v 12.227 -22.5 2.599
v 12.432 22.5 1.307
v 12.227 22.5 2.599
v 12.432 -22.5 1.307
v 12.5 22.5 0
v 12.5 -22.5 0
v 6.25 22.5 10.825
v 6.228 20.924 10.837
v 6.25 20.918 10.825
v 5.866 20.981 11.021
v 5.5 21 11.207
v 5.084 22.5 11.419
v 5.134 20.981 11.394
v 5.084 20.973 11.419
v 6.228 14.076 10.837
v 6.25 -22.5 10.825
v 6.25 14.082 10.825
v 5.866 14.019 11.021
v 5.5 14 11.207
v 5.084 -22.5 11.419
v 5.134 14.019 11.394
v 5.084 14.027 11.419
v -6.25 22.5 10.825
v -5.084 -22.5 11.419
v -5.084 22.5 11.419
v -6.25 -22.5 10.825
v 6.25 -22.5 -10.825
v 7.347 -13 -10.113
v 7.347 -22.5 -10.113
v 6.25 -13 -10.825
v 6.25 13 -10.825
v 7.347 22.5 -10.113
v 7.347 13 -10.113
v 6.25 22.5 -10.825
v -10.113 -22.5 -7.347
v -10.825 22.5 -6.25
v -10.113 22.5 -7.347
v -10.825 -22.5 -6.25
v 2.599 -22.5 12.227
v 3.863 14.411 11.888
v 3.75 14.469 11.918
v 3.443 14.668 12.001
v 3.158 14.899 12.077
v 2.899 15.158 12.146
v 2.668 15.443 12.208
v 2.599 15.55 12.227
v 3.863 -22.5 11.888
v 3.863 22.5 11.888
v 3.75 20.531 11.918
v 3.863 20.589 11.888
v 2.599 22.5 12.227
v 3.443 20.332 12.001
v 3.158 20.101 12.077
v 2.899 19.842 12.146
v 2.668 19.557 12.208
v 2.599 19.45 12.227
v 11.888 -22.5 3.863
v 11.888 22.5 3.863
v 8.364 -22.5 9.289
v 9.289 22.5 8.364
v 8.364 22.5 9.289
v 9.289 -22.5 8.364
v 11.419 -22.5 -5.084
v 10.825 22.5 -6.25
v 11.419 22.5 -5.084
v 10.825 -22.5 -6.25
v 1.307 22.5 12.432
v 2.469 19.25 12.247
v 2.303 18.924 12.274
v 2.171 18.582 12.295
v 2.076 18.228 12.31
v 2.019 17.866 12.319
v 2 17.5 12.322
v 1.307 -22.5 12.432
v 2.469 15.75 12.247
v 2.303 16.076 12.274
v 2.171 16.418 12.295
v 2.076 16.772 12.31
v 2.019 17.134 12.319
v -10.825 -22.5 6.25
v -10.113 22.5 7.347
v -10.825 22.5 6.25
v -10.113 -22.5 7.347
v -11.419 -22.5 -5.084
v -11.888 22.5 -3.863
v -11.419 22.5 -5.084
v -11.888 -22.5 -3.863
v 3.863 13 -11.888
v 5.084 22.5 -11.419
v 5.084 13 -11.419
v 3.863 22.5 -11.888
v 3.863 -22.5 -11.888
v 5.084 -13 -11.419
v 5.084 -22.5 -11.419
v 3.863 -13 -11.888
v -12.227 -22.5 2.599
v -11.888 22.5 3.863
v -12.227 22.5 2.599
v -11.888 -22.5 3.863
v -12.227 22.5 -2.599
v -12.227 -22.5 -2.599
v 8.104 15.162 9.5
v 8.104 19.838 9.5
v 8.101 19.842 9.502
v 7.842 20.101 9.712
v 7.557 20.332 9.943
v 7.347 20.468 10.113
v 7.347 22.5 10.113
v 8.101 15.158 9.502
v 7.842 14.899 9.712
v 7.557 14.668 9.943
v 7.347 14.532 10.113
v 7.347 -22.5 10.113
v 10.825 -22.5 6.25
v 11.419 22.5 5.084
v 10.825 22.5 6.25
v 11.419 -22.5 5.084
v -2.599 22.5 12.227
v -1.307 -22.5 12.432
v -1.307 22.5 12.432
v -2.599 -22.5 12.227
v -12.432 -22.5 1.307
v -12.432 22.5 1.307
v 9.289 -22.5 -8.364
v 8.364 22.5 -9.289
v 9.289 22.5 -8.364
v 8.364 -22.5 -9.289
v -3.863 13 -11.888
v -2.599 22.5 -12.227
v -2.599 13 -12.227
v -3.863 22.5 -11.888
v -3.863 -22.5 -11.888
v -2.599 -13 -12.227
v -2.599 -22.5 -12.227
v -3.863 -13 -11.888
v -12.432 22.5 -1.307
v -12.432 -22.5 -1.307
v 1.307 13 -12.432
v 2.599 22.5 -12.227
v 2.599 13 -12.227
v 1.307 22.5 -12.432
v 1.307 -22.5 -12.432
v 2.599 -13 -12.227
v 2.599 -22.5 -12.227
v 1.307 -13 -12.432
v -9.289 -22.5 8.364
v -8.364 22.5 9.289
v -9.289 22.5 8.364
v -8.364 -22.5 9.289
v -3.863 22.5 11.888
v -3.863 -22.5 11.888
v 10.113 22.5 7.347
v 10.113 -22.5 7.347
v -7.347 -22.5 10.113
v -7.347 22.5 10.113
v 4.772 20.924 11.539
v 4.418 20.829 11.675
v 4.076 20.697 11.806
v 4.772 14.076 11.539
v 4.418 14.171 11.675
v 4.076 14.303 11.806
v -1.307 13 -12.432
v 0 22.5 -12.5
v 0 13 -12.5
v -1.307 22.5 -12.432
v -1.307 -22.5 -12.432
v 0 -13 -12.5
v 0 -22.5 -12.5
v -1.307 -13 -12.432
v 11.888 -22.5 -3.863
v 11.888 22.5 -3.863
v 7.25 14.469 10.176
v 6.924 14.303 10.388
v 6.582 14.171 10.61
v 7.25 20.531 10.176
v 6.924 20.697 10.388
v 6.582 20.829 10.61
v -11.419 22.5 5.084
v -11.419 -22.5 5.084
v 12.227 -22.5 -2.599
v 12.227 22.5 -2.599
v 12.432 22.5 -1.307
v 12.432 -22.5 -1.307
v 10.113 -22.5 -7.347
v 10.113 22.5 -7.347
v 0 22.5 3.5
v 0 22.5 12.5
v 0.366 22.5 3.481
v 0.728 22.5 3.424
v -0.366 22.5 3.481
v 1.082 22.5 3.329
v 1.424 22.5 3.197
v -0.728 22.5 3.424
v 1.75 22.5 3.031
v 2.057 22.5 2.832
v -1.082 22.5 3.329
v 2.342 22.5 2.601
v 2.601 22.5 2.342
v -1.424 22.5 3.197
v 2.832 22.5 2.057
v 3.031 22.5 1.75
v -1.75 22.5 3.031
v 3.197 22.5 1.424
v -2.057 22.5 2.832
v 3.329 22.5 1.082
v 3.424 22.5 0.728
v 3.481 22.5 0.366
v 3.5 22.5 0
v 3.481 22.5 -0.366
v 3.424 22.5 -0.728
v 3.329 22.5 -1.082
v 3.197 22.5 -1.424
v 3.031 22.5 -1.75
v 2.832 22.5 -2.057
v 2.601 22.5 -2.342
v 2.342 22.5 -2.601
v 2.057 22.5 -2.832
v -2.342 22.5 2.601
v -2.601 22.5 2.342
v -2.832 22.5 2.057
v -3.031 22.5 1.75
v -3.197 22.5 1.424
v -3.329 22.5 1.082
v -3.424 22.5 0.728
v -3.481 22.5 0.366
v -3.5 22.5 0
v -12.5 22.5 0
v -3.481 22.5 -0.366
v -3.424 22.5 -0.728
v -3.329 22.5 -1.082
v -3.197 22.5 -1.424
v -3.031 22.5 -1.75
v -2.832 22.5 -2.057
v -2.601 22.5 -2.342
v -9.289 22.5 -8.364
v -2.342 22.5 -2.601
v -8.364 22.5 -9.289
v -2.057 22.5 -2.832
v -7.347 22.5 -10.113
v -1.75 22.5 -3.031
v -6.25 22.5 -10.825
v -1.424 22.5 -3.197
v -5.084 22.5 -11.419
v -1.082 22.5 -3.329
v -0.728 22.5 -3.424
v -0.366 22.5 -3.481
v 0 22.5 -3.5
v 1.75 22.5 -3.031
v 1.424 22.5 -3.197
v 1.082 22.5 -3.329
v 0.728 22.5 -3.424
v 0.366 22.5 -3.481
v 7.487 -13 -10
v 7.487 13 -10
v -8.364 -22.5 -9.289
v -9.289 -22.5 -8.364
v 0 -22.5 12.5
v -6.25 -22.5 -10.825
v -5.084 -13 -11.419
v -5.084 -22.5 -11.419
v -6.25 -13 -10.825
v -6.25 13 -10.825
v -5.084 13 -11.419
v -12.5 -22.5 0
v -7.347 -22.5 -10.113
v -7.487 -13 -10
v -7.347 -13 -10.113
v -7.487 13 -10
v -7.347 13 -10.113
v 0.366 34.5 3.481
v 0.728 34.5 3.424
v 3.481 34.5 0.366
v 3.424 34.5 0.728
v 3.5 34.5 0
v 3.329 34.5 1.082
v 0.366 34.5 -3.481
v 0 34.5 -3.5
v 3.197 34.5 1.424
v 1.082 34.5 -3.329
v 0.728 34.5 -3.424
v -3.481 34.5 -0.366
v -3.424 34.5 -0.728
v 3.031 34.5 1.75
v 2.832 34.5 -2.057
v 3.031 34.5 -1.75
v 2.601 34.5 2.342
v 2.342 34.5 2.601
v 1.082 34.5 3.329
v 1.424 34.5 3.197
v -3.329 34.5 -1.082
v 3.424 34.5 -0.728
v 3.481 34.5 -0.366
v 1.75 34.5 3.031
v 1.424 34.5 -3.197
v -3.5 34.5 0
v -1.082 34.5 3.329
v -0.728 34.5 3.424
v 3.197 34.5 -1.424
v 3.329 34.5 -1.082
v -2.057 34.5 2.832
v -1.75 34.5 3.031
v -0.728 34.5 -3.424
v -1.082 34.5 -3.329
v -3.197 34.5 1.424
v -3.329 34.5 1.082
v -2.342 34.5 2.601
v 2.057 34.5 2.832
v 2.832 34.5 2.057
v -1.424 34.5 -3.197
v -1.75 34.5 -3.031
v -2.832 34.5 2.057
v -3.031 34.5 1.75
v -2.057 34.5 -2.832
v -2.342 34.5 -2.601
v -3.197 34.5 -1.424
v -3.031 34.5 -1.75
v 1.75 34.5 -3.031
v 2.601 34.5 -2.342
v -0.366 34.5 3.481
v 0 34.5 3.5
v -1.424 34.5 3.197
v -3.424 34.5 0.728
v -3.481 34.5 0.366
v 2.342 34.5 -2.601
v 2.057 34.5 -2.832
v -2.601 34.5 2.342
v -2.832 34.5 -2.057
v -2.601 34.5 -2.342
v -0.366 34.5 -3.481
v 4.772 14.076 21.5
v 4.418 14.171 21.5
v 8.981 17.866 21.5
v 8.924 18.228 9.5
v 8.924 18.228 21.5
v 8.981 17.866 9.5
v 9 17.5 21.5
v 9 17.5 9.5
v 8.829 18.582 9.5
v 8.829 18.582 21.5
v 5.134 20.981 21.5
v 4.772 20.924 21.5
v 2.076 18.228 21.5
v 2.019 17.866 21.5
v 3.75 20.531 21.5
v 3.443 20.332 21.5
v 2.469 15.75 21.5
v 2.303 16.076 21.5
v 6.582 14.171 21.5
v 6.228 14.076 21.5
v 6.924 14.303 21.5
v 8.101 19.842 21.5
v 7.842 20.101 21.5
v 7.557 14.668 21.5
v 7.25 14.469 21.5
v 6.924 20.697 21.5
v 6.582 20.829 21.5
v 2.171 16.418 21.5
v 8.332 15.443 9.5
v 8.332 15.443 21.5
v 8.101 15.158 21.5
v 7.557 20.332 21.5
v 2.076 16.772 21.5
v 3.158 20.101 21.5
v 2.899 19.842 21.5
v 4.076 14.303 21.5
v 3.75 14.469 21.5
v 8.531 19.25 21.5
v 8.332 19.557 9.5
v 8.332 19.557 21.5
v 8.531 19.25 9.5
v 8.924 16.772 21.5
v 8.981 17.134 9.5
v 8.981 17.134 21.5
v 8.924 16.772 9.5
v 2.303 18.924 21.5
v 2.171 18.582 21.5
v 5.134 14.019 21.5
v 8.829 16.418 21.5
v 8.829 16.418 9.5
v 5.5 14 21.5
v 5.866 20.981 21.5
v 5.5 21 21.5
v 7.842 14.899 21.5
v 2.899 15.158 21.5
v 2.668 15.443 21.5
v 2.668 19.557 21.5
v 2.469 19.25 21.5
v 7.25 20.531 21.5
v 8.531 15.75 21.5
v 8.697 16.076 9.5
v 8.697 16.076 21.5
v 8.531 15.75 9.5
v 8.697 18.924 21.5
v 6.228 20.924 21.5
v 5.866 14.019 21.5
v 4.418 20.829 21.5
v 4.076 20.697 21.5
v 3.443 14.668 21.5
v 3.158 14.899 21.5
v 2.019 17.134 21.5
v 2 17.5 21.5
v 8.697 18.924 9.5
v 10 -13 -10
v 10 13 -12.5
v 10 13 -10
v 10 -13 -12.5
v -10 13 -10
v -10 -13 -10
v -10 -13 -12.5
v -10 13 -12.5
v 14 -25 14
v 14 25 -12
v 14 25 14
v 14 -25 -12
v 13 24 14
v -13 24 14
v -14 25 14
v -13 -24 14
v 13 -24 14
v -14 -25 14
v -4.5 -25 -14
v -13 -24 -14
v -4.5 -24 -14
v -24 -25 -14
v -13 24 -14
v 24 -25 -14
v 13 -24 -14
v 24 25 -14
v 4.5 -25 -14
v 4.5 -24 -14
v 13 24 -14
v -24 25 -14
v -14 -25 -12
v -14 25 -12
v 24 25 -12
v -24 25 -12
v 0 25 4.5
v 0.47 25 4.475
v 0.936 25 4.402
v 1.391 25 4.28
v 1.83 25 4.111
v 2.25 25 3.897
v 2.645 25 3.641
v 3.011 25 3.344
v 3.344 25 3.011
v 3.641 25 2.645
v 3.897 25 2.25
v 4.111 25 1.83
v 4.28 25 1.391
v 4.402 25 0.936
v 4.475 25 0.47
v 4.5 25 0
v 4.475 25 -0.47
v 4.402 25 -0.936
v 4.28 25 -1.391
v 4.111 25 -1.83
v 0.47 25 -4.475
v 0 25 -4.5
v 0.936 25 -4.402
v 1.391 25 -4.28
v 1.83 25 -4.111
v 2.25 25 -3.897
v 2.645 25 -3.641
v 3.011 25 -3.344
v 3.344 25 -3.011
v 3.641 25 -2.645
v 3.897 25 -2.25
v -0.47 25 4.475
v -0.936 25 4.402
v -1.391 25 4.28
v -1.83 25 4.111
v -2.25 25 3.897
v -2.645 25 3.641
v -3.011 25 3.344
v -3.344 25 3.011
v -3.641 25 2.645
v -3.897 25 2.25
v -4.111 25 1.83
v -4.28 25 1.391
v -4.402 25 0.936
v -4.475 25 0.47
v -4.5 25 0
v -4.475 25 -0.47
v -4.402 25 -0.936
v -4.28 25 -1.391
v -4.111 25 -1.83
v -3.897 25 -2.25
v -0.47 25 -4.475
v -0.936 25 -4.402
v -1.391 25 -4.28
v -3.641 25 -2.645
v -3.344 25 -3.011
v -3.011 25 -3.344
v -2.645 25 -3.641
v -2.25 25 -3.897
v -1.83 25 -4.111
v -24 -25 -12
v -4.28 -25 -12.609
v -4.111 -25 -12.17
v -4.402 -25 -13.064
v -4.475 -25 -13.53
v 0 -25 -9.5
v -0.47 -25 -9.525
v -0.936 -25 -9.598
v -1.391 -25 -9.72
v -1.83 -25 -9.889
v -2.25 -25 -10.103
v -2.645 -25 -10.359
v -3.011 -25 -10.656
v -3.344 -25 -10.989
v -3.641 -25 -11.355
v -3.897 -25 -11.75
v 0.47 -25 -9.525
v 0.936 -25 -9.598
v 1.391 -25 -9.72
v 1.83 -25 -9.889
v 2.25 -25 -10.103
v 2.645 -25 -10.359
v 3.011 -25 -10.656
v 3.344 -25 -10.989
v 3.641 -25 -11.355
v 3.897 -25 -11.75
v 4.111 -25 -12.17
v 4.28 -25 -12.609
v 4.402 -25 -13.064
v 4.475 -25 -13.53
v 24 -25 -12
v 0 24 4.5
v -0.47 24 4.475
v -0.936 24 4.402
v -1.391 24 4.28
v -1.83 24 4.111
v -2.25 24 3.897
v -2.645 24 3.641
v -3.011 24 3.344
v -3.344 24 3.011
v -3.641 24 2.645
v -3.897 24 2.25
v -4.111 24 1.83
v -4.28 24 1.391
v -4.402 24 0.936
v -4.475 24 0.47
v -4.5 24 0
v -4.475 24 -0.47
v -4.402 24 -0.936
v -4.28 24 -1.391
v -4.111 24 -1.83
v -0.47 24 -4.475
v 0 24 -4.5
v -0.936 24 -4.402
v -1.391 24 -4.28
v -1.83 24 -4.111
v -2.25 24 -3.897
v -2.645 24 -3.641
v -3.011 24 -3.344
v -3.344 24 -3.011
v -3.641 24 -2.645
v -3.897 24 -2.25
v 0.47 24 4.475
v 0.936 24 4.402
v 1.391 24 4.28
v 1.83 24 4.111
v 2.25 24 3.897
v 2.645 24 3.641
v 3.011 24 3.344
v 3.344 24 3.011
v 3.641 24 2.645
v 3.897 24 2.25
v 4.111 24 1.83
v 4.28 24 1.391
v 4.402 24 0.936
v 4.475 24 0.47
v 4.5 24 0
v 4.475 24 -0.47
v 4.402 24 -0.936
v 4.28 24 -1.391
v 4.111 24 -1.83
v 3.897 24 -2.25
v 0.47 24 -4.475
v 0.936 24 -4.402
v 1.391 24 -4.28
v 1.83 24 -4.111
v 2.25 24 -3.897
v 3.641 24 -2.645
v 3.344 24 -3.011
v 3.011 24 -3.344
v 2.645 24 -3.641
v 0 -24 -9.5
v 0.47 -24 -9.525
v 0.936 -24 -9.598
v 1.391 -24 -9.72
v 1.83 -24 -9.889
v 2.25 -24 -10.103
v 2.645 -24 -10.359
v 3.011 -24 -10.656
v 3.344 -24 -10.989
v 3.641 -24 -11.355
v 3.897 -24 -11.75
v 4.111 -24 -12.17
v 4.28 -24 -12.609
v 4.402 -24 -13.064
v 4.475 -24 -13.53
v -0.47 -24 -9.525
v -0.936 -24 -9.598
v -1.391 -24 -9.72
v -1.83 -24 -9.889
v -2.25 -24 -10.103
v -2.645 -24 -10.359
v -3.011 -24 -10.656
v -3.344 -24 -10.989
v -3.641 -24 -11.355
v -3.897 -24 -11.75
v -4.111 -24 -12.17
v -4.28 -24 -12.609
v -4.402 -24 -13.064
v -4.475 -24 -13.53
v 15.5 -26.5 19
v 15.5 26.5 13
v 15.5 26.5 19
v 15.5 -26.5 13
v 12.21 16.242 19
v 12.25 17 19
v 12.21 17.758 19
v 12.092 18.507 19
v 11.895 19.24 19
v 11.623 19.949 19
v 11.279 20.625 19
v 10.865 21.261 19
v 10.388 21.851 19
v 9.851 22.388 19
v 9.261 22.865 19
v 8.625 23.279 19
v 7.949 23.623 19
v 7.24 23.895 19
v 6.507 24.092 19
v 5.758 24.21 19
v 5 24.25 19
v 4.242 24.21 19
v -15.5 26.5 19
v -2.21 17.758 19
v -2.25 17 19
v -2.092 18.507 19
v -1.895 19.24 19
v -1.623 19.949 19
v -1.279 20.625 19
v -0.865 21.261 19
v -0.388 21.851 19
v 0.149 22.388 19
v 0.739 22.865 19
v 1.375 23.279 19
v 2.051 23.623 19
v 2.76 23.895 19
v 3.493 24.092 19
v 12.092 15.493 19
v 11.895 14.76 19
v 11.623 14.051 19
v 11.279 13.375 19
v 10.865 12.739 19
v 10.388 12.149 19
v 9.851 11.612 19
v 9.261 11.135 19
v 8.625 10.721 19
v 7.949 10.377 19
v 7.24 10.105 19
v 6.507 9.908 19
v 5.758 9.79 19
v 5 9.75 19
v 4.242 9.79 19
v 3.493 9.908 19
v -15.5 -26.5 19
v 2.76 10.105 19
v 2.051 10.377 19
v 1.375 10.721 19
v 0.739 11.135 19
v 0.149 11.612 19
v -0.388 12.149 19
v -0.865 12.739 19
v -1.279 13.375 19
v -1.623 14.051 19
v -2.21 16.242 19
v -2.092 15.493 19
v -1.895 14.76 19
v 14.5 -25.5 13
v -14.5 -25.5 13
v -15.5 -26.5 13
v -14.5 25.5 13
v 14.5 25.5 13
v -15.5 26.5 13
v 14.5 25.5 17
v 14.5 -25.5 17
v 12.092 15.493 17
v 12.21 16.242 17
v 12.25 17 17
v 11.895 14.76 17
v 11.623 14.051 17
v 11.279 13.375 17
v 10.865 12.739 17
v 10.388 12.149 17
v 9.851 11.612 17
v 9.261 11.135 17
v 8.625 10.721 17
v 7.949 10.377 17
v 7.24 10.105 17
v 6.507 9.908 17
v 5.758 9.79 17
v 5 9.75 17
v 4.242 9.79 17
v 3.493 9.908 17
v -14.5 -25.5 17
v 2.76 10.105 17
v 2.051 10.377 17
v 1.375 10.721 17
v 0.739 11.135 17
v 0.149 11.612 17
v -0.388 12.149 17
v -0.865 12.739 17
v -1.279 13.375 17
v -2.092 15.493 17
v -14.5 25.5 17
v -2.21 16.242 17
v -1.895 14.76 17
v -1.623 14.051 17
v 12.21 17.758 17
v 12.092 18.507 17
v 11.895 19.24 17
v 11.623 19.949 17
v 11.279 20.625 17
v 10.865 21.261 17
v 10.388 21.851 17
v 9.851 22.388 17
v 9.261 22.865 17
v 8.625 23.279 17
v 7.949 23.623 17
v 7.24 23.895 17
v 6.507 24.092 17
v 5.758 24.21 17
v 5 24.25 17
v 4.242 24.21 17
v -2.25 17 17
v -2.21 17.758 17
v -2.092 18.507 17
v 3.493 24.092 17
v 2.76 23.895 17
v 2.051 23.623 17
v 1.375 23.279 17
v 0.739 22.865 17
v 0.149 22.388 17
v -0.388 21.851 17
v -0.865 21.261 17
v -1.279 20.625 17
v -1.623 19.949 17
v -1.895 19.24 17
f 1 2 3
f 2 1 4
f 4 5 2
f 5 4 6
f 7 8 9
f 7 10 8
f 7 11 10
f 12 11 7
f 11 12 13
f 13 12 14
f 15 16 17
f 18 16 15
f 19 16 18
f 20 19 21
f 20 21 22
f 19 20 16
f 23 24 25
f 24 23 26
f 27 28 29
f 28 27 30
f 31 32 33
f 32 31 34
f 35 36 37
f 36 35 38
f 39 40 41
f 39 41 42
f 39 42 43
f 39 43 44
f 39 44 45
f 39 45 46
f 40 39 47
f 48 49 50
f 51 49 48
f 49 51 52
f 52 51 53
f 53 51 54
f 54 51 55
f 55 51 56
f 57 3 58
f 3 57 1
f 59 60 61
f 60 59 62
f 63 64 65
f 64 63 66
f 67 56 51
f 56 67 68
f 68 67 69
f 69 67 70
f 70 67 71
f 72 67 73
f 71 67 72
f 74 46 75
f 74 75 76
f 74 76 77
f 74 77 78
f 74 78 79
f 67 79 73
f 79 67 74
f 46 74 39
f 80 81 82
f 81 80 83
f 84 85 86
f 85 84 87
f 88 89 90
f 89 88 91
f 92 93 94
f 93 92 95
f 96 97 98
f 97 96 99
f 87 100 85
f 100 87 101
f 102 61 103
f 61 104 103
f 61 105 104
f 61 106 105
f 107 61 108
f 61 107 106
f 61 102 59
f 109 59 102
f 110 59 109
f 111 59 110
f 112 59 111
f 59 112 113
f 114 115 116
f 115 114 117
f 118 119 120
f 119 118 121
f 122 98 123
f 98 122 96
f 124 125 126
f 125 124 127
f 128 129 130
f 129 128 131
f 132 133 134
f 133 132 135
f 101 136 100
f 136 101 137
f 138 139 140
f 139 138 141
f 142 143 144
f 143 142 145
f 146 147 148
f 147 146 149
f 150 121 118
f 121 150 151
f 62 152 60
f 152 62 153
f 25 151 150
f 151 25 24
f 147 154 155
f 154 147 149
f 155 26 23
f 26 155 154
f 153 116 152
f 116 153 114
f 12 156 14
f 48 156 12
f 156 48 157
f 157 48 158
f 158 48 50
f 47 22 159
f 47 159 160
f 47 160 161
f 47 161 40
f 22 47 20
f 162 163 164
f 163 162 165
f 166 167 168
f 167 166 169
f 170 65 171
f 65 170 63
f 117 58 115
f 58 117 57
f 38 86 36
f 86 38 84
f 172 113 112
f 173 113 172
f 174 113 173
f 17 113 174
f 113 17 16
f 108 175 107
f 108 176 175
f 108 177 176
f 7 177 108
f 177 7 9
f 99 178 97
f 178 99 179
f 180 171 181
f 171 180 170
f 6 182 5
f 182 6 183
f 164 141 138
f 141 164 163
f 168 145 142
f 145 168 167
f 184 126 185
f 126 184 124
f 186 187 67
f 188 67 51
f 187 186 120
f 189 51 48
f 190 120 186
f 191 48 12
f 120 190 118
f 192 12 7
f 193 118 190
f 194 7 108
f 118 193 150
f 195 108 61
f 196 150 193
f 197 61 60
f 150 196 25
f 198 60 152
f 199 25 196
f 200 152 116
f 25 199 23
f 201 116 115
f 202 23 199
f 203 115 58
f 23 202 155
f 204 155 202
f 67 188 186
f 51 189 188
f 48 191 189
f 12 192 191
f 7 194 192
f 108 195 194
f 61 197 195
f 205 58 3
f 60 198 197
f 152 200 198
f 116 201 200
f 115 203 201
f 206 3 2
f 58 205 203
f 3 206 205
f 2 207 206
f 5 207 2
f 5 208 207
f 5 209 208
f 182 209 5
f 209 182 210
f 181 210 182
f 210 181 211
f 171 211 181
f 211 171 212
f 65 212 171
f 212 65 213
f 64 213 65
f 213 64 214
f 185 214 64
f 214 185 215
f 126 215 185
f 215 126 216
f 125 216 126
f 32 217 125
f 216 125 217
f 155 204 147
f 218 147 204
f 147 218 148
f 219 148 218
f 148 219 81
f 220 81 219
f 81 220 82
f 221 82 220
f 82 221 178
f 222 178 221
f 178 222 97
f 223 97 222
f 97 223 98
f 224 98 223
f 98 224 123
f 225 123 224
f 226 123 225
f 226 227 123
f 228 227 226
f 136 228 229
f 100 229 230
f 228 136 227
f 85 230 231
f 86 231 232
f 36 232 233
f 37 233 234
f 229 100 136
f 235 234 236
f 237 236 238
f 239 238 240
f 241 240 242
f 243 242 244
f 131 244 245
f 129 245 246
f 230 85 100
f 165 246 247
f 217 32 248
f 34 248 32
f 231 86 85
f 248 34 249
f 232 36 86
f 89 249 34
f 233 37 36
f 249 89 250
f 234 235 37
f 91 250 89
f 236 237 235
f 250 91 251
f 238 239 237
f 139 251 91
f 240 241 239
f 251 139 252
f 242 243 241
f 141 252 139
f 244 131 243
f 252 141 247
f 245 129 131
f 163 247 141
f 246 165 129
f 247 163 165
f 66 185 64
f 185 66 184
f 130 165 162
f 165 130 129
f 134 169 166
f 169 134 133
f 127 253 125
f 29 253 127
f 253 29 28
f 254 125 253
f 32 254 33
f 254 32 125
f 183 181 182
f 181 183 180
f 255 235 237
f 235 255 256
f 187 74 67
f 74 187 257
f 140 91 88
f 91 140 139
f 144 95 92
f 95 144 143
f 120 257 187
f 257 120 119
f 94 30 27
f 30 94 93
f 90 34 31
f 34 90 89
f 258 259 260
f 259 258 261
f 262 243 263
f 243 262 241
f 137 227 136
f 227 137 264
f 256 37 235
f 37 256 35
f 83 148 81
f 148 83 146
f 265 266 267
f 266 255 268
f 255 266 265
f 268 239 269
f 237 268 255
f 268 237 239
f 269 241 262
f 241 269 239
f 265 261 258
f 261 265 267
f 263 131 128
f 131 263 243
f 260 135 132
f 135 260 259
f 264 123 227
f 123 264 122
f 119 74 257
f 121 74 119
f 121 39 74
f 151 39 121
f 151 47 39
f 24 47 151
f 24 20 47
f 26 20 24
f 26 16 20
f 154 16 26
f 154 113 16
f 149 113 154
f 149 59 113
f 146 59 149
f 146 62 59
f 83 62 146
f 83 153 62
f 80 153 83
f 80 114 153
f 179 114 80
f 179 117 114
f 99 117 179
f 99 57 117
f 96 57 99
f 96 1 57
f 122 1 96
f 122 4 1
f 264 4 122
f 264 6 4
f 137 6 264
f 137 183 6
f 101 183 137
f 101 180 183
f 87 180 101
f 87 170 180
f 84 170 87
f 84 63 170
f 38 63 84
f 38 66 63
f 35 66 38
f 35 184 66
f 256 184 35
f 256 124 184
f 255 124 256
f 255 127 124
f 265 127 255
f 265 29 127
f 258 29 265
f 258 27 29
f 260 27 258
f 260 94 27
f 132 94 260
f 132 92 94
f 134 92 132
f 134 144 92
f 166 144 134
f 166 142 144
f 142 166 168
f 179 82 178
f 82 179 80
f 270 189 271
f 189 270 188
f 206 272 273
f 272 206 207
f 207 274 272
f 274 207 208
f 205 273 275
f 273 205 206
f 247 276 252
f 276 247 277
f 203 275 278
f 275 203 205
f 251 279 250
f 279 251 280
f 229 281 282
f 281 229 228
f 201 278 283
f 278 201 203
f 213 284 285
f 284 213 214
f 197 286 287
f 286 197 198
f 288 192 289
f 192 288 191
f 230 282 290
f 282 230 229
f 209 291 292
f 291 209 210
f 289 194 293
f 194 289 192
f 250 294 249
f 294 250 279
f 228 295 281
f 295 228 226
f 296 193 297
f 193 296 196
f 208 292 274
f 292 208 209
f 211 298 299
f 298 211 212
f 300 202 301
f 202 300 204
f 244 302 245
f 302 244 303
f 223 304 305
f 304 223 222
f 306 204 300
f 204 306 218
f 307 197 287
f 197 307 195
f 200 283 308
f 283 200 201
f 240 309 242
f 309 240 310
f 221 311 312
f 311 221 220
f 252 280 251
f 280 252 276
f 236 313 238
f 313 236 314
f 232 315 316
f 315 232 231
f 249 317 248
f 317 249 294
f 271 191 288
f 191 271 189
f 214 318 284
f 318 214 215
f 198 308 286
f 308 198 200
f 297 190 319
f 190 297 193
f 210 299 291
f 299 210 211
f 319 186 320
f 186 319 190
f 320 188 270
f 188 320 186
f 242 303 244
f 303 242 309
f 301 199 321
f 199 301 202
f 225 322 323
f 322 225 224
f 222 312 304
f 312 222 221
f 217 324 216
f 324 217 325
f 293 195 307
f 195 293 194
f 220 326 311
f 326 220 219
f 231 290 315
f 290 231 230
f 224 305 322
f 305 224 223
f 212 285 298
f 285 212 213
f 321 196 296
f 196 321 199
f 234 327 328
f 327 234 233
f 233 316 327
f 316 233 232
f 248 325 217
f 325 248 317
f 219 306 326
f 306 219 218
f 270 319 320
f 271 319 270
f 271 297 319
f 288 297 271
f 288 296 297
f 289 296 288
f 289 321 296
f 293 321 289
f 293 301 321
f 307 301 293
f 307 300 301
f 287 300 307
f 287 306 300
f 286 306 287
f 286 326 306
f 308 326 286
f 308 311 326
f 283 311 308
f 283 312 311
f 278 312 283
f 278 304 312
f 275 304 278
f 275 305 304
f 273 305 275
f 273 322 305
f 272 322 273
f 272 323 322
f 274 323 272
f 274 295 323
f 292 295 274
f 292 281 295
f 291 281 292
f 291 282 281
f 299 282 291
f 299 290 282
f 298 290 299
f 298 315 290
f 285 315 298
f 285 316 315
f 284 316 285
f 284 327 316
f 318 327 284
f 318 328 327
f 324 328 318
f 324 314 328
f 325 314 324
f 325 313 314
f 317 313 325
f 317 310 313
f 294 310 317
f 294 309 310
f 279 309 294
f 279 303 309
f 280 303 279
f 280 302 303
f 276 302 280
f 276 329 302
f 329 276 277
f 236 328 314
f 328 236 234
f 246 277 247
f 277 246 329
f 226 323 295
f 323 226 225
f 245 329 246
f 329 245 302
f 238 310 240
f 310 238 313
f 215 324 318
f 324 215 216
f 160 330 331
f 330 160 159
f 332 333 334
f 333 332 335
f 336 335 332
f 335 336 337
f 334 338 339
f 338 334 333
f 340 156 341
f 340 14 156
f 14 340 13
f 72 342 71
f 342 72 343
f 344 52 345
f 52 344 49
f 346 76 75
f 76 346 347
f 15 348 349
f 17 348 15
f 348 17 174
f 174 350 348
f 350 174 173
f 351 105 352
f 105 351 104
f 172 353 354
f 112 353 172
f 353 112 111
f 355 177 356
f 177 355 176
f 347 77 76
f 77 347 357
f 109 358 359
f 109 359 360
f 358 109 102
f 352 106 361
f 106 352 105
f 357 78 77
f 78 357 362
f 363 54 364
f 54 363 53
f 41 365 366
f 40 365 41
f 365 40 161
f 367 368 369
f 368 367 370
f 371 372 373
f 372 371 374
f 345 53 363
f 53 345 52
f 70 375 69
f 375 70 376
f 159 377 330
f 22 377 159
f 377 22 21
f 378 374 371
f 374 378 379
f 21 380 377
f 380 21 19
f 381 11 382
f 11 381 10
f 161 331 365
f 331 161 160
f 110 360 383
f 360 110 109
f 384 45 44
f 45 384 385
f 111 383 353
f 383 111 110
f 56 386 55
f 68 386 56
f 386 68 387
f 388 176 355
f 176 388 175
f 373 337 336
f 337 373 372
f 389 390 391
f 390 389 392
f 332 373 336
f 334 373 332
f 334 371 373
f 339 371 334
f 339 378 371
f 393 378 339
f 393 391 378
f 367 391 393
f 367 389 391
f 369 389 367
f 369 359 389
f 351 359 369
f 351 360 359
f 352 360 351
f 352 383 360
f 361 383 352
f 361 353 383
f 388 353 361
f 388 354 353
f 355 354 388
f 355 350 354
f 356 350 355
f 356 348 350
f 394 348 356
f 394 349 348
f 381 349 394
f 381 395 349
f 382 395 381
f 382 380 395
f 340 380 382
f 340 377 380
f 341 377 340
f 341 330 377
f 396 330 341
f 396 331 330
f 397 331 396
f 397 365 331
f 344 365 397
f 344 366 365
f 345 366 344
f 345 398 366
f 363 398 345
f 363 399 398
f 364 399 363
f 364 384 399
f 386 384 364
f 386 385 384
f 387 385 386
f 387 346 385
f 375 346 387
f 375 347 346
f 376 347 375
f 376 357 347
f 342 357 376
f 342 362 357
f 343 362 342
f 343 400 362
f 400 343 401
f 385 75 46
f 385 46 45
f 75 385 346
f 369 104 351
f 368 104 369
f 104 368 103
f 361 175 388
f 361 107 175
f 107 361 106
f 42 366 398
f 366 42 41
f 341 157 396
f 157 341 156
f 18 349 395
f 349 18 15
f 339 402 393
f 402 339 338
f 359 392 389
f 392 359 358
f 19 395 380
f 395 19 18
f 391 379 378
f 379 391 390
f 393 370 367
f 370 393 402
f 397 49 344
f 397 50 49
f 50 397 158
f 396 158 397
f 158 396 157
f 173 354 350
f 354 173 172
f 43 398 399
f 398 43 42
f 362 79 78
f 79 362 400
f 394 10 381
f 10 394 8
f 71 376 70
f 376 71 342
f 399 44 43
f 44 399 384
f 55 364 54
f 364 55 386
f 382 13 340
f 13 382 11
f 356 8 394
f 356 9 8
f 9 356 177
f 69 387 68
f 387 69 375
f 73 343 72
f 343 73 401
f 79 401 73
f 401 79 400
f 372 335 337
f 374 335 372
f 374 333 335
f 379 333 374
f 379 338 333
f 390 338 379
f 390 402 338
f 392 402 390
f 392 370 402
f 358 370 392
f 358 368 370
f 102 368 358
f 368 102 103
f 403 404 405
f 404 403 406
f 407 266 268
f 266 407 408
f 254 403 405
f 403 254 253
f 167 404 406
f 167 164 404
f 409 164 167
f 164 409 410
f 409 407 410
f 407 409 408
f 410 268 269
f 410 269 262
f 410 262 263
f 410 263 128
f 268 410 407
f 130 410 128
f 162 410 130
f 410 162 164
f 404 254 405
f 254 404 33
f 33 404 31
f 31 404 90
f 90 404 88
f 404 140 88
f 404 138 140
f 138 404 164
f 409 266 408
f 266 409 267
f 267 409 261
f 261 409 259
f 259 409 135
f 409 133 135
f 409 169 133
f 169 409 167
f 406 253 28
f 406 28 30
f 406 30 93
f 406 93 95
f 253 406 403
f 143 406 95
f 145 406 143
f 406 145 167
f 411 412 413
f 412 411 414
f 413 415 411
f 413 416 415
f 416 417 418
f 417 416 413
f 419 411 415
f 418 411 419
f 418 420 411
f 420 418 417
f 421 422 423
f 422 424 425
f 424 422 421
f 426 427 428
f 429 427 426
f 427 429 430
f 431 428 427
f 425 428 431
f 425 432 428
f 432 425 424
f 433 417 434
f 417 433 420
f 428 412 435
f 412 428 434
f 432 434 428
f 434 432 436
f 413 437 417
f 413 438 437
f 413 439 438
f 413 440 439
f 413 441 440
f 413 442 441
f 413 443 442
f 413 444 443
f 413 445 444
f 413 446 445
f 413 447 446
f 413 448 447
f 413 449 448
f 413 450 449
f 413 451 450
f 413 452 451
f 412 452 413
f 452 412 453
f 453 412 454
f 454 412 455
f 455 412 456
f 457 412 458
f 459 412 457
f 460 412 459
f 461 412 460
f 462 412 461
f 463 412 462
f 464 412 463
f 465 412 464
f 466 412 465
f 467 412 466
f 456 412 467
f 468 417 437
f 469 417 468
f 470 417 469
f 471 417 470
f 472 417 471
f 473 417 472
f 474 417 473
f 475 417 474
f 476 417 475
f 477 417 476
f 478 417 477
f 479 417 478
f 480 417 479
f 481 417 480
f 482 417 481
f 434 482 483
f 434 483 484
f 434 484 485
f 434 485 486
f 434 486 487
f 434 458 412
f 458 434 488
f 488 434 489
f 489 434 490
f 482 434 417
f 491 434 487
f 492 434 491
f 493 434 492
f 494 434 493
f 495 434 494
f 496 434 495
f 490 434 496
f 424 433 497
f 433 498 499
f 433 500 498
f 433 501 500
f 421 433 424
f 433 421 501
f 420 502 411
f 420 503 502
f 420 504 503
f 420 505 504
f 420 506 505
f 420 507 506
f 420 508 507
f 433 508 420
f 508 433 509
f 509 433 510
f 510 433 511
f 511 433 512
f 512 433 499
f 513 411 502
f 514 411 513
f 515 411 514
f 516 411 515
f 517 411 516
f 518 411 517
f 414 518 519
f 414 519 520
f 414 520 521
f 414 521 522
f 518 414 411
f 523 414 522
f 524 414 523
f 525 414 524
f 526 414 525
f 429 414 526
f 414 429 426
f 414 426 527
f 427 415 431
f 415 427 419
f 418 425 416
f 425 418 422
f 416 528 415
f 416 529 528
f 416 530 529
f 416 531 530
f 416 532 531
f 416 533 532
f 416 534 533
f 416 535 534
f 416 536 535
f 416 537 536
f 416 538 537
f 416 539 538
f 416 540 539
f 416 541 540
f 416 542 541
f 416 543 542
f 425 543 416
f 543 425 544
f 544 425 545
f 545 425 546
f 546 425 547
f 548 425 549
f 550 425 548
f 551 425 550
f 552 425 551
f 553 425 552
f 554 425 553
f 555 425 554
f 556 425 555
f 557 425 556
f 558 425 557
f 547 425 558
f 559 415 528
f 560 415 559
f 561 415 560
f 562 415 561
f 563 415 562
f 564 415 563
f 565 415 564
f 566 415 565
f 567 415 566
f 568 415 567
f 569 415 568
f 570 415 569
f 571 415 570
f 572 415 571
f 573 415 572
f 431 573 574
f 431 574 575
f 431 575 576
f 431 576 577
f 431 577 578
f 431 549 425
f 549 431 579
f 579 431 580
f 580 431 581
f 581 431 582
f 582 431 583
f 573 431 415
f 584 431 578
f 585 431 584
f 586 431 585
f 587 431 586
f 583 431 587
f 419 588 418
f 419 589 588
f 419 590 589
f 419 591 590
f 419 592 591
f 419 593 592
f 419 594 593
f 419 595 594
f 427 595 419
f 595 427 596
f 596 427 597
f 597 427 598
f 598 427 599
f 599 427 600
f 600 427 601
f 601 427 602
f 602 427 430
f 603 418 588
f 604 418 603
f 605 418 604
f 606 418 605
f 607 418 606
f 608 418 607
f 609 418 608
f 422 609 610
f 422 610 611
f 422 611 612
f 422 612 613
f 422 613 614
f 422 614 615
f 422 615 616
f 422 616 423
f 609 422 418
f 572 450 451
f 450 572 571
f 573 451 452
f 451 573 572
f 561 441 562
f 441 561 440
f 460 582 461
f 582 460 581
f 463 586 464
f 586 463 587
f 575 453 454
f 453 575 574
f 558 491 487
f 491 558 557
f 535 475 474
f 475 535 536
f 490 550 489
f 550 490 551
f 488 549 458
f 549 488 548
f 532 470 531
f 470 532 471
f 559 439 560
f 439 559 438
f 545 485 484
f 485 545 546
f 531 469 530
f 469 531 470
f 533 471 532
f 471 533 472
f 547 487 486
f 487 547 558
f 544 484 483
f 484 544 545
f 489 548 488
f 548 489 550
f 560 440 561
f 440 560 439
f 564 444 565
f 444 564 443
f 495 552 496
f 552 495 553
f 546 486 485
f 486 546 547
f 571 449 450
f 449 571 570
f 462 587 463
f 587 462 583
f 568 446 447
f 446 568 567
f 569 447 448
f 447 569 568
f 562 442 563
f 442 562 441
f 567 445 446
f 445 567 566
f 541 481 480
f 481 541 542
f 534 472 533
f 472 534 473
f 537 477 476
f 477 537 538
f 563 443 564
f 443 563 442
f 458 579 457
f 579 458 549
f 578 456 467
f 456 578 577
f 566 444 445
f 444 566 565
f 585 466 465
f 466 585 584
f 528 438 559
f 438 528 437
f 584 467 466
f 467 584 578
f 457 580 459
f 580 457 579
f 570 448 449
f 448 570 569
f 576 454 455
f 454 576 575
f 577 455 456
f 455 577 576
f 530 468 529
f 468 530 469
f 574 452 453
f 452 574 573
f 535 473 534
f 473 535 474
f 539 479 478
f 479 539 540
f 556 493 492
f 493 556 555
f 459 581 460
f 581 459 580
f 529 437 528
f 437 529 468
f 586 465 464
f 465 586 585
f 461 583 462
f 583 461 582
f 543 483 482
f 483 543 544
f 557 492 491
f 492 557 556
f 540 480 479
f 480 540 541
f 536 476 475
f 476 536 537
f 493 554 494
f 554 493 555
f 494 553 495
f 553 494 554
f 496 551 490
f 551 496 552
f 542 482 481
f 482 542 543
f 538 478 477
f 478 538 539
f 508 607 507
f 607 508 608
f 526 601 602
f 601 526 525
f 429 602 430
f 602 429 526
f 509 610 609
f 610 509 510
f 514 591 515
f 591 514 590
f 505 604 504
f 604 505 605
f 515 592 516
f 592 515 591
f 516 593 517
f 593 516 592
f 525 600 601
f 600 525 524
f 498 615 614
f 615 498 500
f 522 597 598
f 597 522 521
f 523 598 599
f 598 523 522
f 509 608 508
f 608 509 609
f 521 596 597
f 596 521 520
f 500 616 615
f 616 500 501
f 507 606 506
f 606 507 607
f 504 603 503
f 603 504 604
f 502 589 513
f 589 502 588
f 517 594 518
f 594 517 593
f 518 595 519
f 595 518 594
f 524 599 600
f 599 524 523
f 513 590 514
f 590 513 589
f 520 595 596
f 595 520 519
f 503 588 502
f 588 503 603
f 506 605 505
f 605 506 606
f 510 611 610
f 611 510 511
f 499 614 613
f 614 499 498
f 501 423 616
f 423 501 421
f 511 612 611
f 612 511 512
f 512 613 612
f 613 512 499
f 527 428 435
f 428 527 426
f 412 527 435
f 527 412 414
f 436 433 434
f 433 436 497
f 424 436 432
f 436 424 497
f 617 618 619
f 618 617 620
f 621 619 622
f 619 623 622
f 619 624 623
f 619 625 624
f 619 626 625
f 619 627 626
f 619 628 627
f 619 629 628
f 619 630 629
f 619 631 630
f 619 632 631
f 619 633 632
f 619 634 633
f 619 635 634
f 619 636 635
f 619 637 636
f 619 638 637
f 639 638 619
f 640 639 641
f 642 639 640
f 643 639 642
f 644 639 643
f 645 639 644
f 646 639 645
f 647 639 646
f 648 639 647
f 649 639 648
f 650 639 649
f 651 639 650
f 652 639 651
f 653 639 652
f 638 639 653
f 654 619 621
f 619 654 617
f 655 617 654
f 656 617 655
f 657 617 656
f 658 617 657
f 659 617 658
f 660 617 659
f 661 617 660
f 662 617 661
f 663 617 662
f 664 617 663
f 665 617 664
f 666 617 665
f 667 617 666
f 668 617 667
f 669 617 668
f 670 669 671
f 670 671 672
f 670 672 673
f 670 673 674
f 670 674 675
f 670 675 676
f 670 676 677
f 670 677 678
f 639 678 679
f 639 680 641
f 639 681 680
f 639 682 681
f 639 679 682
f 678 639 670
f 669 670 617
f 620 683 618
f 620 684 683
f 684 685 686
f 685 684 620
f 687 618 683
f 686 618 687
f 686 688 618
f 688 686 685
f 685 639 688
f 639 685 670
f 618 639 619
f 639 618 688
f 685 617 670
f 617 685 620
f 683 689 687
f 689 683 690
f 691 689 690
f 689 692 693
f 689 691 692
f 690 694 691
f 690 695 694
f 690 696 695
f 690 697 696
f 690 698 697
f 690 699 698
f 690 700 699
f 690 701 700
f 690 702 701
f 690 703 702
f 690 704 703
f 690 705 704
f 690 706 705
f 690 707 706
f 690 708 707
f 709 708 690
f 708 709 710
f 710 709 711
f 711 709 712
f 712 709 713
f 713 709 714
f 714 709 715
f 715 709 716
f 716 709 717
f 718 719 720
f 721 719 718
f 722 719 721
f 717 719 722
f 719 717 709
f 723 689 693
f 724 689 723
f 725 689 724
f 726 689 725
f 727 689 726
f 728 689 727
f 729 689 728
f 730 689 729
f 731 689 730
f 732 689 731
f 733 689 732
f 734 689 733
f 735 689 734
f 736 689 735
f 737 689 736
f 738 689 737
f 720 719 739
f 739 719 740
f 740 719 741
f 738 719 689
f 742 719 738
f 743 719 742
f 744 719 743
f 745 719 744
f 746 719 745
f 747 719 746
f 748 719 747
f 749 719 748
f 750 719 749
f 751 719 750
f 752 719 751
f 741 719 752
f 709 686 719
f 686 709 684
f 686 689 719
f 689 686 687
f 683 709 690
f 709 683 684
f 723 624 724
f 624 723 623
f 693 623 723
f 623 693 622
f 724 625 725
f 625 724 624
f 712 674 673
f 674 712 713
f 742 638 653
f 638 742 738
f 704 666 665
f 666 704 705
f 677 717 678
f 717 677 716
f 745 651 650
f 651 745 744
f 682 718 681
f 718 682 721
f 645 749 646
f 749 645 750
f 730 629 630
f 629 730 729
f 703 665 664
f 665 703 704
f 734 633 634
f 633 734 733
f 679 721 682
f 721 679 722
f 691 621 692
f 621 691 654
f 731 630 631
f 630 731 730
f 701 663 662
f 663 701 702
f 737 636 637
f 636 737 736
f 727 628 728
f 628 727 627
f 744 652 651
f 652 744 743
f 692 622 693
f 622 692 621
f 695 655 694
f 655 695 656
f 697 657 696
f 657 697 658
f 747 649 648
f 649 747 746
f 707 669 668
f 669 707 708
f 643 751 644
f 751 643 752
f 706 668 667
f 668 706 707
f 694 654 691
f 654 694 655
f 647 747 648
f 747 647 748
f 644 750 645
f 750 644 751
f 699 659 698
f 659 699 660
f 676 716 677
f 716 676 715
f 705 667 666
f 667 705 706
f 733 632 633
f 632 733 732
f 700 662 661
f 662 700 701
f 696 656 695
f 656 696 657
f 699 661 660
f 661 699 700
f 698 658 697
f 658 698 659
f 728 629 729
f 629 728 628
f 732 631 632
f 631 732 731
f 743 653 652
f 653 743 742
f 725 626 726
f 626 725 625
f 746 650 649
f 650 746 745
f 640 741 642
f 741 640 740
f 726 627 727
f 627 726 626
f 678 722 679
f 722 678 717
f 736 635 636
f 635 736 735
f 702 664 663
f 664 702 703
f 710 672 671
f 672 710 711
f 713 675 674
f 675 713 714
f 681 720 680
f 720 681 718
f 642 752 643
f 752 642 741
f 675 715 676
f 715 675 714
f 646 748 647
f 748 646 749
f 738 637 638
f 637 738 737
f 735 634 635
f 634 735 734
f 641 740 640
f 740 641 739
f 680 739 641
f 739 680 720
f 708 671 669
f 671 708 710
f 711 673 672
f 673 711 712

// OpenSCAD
// Tauchpumpenhalterung

$fn = 60;

tauchpumpe = true;
box = true;
deckel = true;

if (tauchpumpe) tauchpumpe();
if (box) box();
if (deckel) deckel();
   

module tauchpumpe() {
    l=45;
    b=25;
    a=7;
    al=12;
    p=20;
    pl=26;
    pd=2.5;
    
    color("lightyellow")
    union() {
        rotate([90,0,0])
        cylinder(d=b,h=l,center=true);
        
        translate([0,l/2+al/2,0])
        rotate([90,0,0])
        cylinder(d=a,h=al,center=true);
        
        translate([b/2-a,l/2-5,b/2-al/2+9])
        cylinder(d=a,h=al,center=true);
        
        translate([-p/2,-pl/2,-b/2])
        cube([p,pl,pd]);
    }
}

module box() {
    l=50;
    b=28;
    h=b;
    w=2;
    s=10;

    a=9;
    al=12;

    difference() {
        cube([b,l,h],center=true);
        translate([0,0,w/2])
        cube([b-w,l-w,h+w*2],center=true);

        translate([0,l/2+al/2-5,0])
        rotate([90,0,0])
        cylinder(d=a,h=al,center=true);

        translate([0,-l/2,-b/2])
        rotate([90,0,0])
        cylinder(d=a,h=al,center=true);

    }
    
    translate([b/2,-l/2,-b/2])
    cube([s,l,w]);
    
    translate([-b/2-s,-l/2,-b/2])
    cube([s,l,w]);
    
}

module deckel(){
    l=50;
    b=28;
    h=b;
    w=2;
    s=10;

    a=9;
    al=12;
    difference() {
        translate([0,0,b/2+w])
        cube([b+w+1,l+w+1,3*w],center=true);
        translate([0,0,b/2])
        cube([b+w-1,l+w-1,3*w],center=true);
        translate([b/2-a,l/2-w-6,b/2-al/2+2+2*w])
        cylinder(d=14.5,h=al,center=true);

    }
}
